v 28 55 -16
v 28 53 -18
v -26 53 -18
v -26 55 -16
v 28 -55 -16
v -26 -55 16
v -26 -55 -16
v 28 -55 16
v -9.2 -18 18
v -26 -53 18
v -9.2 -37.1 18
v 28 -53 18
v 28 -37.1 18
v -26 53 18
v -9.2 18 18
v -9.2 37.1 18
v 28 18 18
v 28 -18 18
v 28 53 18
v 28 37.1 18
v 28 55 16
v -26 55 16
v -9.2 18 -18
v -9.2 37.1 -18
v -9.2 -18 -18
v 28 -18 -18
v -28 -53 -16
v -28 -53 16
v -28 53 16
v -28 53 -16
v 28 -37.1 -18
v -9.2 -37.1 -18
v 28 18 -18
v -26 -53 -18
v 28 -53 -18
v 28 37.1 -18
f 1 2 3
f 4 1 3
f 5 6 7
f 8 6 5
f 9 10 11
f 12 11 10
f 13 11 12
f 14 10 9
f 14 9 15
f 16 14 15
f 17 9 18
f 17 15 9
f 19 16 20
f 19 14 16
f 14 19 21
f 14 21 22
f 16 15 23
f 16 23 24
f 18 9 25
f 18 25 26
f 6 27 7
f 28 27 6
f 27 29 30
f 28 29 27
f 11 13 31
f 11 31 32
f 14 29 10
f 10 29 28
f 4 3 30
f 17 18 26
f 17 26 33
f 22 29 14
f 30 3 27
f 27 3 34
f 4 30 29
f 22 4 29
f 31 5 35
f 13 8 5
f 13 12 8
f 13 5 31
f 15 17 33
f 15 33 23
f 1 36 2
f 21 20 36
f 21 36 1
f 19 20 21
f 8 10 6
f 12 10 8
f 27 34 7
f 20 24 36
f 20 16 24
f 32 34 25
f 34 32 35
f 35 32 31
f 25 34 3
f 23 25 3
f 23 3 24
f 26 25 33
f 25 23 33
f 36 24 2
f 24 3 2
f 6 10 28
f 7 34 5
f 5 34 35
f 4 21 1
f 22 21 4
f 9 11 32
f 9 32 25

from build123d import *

# Parameters (mm, degrees)
BOSS_EXTRUDE1_DEPTH = 18
CHAMFER1_SIZE       = 2


with BuildPart() as part:
    # Sketch1 → Boss-Extrude1 (new, symmetric)
    with BuildSketch(Plane.XY):
        Polygon((28, 55), (-28, 55), (-28, -55), (28, -55), (28, -37.1), (-9.2, -37.1), (-9.2, -18), (28, -18), (28, 18), (-9.2, 18), (-9.2, 37.1), (28, 37.1), align=None)
    extrude(amount=BOSS_EXTRUDE1_DEPTH, both=True)

    # Chamfer1
    chamfer1_edges = [part.edges().sort_by_distance(p)[0] for p in [
        (-28, 0, 18),
        (0, -55, -18),
        (-28, 0, -18),
        (0, 55, -18),
        (0, -55, 18),
        (-28, -55, 0),
        (-28, 55, 0),
        (0, 55, 18),
    ]]
    chamfer(chamfer1_edges, length=CHAMFER1_SIZE)


solid = part.part
